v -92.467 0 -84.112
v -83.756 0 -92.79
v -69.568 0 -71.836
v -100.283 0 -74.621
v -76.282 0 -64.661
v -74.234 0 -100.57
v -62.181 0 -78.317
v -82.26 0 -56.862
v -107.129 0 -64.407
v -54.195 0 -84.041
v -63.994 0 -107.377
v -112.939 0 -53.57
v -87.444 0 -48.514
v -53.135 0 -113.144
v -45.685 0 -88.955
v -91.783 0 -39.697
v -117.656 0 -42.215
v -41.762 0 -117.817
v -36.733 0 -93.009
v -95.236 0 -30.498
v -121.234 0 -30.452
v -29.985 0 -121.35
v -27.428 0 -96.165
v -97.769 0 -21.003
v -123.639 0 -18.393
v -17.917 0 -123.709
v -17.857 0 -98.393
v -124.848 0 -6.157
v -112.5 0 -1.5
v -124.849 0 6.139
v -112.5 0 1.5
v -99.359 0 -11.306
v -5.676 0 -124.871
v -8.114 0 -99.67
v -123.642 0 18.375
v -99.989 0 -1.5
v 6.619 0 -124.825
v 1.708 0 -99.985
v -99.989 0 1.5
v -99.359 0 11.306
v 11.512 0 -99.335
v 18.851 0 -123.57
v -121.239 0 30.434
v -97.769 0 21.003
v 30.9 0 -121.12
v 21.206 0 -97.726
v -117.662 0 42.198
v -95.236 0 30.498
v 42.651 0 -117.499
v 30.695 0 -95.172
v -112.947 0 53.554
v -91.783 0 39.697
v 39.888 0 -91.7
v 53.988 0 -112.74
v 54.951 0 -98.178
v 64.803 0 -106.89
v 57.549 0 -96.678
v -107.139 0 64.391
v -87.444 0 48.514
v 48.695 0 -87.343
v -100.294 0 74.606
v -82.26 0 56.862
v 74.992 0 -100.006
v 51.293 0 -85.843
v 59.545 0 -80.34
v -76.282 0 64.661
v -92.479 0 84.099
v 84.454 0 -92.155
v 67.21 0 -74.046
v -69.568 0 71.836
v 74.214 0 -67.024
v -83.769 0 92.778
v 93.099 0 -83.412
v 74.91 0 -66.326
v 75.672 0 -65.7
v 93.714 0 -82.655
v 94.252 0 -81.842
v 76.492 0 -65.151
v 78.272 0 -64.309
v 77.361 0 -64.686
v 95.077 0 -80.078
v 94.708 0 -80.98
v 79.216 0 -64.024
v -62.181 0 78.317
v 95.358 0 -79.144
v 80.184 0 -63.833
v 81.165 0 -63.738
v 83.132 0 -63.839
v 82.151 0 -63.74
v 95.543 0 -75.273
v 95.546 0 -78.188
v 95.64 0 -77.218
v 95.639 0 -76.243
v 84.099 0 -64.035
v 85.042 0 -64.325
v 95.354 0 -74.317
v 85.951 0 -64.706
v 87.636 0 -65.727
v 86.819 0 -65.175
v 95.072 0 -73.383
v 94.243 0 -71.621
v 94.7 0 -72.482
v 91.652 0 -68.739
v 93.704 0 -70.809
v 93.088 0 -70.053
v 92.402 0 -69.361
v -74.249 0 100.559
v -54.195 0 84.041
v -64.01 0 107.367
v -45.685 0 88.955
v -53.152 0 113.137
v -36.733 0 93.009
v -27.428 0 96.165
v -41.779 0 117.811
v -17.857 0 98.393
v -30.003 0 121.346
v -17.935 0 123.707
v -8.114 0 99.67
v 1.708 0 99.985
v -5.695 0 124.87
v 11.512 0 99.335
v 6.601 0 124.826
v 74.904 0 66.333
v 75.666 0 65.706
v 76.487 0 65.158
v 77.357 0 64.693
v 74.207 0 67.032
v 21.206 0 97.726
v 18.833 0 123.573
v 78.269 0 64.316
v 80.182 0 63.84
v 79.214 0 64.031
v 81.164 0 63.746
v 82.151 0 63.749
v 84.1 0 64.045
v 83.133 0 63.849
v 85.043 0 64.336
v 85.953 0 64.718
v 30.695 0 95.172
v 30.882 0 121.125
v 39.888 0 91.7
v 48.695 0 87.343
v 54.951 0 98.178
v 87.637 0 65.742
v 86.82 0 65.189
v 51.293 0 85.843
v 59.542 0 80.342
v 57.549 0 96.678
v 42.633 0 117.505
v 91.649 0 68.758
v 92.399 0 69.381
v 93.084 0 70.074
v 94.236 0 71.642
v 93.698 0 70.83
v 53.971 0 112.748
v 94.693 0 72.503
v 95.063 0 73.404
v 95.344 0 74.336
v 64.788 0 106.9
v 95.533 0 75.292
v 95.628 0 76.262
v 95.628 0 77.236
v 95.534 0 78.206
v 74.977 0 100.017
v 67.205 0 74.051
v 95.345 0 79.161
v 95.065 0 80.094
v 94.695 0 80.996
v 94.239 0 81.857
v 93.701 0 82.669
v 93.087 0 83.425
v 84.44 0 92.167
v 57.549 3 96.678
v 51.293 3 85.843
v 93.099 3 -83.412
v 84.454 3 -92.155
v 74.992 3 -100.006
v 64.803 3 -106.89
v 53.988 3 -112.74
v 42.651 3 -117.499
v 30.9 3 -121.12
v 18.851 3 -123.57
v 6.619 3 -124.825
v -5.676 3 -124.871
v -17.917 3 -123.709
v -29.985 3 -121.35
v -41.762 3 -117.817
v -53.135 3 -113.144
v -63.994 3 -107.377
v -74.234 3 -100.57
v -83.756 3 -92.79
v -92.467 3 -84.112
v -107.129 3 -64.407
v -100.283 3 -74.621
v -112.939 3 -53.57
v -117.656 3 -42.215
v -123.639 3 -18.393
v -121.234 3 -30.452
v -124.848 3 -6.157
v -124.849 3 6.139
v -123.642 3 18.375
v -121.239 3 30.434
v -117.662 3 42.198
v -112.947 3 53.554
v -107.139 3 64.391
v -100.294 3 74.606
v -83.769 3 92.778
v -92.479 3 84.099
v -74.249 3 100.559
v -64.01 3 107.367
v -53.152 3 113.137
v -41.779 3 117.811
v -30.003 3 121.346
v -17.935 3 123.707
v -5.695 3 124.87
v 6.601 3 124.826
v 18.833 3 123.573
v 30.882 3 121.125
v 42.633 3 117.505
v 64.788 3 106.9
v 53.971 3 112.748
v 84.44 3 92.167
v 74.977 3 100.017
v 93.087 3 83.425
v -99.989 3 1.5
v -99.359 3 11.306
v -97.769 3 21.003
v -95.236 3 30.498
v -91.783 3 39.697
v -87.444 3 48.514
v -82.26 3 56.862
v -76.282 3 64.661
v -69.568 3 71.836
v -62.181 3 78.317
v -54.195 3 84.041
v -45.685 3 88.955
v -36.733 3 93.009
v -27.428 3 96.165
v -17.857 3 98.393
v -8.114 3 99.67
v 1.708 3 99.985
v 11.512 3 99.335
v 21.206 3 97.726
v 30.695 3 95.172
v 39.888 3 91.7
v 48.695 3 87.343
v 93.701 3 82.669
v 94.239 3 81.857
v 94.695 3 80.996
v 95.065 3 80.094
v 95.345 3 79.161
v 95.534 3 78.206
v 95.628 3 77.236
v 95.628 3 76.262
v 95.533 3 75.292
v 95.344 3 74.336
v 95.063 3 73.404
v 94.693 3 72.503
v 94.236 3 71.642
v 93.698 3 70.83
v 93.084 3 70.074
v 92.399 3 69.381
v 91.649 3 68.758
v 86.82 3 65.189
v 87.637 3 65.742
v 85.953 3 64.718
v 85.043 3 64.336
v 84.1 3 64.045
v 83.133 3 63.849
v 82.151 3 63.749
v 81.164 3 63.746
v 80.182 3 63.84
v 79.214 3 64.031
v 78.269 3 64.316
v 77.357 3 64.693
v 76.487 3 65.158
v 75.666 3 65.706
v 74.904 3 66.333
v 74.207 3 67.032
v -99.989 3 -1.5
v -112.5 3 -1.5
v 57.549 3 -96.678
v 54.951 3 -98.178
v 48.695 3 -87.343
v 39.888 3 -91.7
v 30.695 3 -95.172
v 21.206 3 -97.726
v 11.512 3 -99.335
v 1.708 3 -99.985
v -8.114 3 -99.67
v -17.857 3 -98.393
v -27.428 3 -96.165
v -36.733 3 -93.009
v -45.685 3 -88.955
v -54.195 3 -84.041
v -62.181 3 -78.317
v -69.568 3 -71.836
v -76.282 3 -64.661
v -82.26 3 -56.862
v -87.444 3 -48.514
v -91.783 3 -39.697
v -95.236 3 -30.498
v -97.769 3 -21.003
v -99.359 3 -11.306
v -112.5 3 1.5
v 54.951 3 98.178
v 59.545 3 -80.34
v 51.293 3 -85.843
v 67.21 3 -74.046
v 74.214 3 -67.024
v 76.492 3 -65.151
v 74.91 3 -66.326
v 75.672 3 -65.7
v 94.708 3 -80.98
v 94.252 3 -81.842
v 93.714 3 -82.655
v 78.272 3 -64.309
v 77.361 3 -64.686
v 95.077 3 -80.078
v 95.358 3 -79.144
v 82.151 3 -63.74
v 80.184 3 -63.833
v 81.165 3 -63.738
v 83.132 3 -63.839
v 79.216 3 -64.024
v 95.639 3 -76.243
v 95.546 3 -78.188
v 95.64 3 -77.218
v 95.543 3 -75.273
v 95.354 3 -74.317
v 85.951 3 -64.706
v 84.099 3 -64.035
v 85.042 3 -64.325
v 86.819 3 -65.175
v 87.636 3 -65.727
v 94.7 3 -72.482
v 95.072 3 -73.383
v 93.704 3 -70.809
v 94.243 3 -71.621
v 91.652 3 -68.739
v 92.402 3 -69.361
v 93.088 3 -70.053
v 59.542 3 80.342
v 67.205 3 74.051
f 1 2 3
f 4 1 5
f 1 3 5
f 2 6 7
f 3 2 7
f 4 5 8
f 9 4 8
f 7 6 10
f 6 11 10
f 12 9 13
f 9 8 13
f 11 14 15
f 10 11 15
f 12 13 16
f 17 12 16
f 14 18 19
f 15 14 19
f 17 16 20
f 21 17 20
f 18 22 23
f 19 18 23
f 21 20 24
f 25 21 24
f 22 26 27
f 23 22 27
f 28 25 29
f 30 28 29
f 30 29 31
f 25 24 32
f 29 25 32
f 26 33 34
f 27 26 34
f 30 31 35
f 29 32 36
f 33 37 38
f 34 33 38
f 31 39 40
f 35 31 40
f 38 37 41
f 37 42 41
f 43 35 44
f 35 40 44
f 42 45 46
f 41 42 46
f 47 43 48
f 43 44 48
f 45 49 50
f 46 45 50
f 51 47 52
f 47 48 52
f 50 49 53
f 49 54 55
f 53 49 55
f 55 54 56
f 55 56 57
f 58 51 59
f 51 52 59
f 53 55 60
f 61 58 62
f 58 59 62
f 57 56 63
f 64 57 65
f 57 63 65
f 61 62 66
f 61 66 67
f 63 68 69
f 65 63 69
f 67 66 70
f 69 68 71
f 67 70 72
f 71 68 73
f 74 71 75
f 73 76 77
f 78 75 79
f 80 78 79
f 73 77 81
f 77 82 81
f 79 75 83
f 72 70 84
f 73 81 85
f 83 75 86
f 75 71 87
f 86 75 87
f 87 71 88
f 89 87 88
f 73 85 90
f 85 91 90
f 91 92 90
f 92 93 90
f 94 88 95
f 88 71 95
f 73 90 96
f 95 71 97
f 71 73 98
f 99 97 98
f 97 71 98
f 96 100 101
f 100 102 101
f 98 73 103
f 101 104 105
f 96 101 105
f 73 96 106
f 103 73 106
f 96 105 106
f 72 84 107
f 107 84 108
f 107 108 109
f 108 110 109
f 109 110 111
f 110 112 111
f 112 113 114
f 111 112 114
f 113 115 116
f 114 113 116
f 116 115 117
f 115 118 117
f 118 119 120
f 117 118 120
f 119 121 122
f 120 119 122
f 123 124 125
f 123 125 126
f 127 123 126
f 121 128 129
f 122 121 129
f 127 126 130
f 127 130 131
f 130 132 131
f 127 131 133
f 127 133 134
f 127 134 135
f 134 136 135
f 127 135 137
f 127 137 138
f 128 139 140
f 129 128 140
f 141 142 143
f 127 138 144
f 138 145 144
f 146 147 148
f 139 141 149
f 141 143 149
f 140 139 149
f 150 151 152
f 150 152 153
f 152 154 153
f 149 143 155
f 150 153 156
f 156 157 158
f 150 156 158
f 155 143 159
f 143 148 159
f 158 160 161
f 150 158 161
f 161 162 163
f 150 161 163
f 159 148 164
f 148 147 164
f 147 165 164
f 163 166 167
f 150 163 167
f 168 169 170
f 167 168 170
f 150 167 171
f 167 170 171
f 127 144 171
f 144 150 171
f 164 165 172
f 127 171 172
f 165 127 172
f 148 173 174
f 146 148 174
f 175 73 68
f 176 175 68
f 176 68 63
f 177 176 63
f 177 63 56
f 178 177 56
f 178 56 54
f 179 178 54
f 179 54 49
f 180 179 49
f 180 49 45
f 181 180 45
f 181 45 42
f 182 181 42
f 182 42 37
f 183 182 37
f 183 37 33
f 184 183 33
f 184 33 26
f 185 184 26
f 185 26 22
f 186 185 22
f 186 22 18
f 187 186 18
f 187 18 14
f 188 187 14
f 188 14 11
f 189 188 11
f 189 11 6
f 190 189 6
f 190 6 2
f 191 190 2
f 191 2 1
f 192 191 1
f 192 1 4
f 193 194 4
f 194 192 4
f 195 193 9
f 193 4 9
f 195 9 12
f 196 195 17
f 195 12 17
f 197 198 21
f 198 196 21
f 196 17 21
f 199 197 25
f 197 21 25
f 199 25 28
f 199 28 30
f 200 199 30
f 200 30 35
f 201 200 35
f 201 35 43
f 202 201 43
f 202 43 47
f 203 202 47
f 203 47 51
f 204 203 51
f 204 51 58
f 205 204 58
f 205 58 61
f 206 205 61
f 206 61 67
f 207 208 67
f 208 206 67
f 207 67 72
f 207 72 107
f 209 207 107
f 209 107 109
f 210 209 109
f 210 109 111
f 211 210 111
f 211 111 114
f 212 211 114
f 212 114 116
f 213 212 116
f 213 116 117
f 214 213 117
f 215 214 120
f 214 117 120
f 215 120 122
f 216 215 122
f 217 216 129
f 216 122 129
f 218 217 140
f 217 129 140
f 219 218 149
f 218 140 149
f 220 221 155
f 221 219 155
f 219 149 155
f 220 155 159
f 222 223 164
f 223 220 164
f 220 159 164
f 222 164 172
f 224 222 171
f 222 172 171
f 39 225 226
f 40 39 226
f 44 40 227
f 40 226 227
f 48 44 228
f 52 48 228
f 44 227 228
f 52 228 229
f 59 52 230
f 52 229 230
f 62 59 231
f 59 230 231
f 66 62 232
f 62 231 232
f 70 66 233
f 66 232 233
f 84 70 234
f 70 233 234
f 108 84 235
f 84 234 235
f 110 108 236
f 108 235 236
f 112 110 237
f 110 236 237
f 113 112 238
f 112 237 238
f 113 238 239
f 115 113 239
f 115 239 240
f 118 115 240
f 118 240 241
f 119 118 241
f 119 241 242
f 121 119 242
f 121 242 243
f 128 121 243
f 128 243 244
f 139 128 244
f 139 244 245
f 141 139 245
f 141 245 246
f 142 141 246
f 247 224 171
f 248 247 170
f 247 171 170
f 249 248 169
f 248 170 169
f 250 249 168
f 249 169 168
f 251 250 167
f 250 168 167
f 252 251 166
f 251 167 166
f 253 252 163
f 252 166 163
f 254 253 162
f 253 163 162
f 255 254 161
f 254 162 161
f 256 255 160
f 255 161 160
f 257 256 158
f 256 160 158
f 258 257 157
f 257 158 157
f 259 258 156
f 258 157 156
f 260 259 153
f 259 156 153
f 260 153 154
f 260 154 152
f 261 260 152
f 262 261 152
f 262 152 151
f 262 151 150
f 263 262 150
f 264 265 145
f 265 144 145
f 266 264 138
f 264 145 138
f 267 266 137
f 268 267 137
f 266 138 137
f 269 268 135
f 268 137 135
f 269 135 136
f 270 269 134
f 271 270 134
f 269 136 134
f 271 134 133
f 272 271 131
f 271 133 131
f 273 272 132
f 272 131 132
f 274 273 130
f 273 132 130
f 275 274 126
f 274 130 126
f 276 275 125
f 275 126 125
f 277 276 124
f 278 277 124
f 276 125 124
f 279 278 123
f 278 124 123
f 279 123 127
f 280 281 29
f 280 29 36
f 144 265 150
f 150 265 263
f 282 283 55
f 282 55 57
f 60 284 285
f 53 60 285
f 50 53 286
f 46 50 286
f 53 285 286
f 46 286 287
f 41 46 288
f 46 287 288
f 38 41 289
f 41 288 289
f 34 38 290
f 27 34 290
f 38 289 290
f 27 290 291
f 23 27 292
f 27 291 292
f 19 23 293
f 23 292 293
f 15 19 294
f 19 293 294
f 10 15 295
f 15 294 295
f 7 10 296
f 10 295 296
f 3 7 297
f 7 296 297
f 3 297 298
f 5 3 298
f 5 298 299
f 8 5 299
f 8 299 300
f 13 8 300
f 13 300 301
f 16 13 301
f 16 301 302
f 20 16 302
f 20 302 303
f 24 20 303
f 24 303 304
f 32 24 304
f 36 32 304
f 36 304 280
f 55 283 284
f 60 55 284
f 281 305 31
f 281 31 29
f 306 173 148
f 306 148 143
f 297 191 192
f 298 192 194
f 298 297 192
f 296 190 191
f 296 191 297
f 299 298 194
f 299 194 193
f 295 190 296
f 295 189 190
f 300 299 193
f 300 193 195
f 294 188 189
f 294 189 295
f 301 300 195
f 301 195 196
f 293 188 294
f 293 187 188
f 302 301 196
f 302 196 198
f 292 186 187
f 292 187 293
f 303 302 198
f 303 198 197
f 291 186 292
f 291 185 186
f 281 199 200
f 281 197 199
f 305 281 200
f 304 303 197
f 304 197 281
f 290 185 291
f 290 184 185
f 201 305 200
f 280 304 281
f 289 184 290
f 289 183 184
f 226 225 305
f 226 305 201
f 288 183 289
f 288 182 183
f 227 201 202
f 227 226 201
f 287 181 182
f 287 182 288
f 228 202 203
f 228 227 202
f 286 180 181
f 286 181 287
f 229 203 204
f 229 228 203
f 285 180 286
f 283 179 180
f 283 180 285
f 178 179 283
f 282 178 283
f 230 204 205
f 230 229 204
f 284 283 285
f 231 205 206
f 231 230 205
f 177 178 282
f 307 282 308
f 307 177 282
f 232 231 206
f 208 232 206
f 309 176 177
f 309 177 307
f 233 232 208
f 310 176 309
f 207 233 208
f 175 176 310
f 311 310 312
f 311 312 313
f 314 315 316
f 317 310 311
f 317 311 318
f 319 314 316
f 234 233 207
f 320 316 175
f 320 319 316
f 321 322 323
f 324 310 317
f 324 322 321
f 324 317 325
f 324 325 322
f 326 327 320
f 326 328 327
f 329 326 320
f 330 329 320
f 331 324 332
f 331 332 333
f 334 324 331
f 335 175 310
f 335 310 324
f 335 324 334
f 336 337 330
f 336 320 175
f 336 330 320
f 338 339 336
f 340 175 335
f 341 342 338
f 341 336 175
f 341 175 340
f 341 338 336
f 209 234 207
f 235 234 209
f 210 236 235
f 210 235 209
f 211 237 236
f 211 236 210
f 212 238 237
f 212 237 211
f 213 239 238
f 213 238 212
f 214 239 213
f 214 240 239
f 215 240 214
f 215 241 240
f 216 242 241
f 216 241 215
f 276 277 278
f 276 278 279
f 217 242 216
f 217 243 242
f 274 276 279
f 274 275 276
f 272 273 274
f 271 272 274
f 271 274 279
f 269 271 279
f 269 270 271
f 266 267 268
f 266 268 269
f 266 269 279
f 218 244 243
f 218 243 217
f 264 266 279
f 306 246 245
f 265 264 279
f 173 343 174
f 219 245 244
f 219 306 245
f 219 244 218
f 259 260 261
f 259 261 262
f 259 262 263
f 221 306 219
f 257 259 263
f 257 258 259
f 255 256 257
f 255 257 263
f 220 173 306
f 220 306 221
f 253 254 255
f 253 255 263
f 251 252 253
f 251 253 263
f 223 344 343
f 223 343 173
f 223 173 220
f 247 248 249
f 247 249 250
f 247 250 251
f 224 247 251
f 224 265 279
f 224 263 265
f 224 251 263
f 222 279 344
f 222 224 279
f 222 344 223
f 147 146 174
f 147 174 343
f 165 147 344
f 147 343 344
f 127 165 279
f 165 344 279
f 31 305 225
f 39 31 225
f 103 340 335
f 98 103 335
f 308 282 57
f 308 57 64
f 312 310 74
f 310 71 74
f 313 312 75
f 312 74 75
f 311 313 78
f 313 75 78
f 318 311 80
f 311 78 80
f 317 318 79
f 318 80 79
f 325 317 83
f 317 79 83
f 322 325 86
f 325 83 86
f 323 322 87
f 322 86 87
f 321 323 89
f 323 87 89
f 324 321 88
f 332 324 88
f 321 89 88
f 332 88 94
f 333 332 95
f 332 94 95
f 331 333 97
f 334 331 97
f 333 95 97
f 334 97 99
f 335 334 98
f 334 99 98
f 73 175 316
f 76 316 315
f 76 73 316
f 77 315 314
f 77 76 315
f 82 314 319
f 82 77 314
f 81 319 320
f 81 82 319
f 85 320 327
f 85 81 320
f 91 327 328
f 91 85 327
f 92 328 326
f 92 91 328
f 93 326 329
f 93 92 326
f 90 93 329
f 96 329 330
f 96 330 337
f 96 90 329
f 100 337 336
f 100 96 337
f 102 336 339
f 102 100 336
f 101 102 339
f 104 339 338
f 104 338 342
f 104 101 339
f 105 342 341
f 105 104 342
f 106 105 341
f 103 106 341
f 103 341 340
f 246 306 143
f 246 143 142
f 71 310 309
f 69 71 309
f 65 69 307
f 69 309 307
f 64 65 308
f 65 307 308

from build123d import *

# Parameters (mm, degrees)
SKETCH1_R           = 125
BOSS_EXTRUDE1_DEPTH = 3
SKETCH2_R           = 100
CUT_EXTRUDE1_DEPTH  = 3
SKETCH3_W           = 25
SKETCH3_H           = 3
CUT_EXTRUDE2_DEPTH  = 3
CIRPATTERN1_COUNT   = 3
CUT_EXTRUDE3_DEPTH  = 3
FILLET1_R           = 10


with BuildPart() as part:
    # Sketch1 → Boss-Extrude1 (new body)
    with BuildSketch(Plane(origin=(0, 0, 0), x_dir=(1, 0, 0), z_dir=(0, 1, 0))):
        with Locations(Location((0, 0, 0), (0, 0, 270))):
            Circle(SKETCH1_R)
    extrude(amount=BOSS_EXTRUDE1_DEPTH)

    # Sketch2 → Cut-Extrude1 (cut)
    with BuildSketch(Plane(origin=(0, 3, 0), x_dir=(1, 0, 0), z_dir=(0, 1, 0))):
        with Locations(Location((0, 0, 0), (0, 0, 270))):
            Circle(SKETCH2_R)
    extrude(amount=-CUT_EXTRUDE1_DEPTH, mode=Mode.SUBTRACT)

    # Sketch3 → Cut-Extrude2 (cut)
    with BuildSketch(Plane(origin=(0, 3, 0), x_dir=(1, 0, 0), z_dir=(0, 1, 0))):
        with Locations((-100, 0)):
            Rectangle(SKETCH3_W, SKETCH3_H)
    cut_extrude2 = extrude(amount=-CUT_EXTRUDE2_DEPTH, mode=Mode.SUBTRACT)

    # CirPattern1: Cut-Extrude2 ×3 about axis
    cirpattern1_axis = Axis((0, 0, 0), (0, 1, 0))
    for i in range(1, CIRPATTERN1_COUNT):
        add(cut_extrude2.rotate(cirpattern1_axis, i * 360 / CIRPATTERN1_COUNT), mode=Mode.SUBTRACT)

    # Sketch4 → Cut-Extrude3 (cut)
    with BuildSketch(Plane(origin=(0, 3, 0), x_dir=(1, 0, 0), z_dir=(0, 1, 0))):
        with BuildLine():
            Line((80, -60), (99.982550279, -75.023260657))
            ThreePointArc((99.982550279, -75.023260657), (124.999999154, -0.014539179), (100, 75))
            Line((100, 75), (80, 60))
            ThreePointArc((80, 60), (100, 0), (80, -60))
        make_face()
    extrude(amount=-CUT_EXTRUDE3_DEPTH, mode=Mode.SUBTRACT)

    # Fillet1
    fillet1_edges = [part.edges().sort_by_distance(p)[0] for p in [
        (80, 1.5, 60),
        (80, 1.5, -60),
        (100, 1.5, -75),
        (99.982550279, 1.5, 75.023260657),
    ]]
    fillet(fillet1_edges, radius=FILLET1_R)


solid = part.part
